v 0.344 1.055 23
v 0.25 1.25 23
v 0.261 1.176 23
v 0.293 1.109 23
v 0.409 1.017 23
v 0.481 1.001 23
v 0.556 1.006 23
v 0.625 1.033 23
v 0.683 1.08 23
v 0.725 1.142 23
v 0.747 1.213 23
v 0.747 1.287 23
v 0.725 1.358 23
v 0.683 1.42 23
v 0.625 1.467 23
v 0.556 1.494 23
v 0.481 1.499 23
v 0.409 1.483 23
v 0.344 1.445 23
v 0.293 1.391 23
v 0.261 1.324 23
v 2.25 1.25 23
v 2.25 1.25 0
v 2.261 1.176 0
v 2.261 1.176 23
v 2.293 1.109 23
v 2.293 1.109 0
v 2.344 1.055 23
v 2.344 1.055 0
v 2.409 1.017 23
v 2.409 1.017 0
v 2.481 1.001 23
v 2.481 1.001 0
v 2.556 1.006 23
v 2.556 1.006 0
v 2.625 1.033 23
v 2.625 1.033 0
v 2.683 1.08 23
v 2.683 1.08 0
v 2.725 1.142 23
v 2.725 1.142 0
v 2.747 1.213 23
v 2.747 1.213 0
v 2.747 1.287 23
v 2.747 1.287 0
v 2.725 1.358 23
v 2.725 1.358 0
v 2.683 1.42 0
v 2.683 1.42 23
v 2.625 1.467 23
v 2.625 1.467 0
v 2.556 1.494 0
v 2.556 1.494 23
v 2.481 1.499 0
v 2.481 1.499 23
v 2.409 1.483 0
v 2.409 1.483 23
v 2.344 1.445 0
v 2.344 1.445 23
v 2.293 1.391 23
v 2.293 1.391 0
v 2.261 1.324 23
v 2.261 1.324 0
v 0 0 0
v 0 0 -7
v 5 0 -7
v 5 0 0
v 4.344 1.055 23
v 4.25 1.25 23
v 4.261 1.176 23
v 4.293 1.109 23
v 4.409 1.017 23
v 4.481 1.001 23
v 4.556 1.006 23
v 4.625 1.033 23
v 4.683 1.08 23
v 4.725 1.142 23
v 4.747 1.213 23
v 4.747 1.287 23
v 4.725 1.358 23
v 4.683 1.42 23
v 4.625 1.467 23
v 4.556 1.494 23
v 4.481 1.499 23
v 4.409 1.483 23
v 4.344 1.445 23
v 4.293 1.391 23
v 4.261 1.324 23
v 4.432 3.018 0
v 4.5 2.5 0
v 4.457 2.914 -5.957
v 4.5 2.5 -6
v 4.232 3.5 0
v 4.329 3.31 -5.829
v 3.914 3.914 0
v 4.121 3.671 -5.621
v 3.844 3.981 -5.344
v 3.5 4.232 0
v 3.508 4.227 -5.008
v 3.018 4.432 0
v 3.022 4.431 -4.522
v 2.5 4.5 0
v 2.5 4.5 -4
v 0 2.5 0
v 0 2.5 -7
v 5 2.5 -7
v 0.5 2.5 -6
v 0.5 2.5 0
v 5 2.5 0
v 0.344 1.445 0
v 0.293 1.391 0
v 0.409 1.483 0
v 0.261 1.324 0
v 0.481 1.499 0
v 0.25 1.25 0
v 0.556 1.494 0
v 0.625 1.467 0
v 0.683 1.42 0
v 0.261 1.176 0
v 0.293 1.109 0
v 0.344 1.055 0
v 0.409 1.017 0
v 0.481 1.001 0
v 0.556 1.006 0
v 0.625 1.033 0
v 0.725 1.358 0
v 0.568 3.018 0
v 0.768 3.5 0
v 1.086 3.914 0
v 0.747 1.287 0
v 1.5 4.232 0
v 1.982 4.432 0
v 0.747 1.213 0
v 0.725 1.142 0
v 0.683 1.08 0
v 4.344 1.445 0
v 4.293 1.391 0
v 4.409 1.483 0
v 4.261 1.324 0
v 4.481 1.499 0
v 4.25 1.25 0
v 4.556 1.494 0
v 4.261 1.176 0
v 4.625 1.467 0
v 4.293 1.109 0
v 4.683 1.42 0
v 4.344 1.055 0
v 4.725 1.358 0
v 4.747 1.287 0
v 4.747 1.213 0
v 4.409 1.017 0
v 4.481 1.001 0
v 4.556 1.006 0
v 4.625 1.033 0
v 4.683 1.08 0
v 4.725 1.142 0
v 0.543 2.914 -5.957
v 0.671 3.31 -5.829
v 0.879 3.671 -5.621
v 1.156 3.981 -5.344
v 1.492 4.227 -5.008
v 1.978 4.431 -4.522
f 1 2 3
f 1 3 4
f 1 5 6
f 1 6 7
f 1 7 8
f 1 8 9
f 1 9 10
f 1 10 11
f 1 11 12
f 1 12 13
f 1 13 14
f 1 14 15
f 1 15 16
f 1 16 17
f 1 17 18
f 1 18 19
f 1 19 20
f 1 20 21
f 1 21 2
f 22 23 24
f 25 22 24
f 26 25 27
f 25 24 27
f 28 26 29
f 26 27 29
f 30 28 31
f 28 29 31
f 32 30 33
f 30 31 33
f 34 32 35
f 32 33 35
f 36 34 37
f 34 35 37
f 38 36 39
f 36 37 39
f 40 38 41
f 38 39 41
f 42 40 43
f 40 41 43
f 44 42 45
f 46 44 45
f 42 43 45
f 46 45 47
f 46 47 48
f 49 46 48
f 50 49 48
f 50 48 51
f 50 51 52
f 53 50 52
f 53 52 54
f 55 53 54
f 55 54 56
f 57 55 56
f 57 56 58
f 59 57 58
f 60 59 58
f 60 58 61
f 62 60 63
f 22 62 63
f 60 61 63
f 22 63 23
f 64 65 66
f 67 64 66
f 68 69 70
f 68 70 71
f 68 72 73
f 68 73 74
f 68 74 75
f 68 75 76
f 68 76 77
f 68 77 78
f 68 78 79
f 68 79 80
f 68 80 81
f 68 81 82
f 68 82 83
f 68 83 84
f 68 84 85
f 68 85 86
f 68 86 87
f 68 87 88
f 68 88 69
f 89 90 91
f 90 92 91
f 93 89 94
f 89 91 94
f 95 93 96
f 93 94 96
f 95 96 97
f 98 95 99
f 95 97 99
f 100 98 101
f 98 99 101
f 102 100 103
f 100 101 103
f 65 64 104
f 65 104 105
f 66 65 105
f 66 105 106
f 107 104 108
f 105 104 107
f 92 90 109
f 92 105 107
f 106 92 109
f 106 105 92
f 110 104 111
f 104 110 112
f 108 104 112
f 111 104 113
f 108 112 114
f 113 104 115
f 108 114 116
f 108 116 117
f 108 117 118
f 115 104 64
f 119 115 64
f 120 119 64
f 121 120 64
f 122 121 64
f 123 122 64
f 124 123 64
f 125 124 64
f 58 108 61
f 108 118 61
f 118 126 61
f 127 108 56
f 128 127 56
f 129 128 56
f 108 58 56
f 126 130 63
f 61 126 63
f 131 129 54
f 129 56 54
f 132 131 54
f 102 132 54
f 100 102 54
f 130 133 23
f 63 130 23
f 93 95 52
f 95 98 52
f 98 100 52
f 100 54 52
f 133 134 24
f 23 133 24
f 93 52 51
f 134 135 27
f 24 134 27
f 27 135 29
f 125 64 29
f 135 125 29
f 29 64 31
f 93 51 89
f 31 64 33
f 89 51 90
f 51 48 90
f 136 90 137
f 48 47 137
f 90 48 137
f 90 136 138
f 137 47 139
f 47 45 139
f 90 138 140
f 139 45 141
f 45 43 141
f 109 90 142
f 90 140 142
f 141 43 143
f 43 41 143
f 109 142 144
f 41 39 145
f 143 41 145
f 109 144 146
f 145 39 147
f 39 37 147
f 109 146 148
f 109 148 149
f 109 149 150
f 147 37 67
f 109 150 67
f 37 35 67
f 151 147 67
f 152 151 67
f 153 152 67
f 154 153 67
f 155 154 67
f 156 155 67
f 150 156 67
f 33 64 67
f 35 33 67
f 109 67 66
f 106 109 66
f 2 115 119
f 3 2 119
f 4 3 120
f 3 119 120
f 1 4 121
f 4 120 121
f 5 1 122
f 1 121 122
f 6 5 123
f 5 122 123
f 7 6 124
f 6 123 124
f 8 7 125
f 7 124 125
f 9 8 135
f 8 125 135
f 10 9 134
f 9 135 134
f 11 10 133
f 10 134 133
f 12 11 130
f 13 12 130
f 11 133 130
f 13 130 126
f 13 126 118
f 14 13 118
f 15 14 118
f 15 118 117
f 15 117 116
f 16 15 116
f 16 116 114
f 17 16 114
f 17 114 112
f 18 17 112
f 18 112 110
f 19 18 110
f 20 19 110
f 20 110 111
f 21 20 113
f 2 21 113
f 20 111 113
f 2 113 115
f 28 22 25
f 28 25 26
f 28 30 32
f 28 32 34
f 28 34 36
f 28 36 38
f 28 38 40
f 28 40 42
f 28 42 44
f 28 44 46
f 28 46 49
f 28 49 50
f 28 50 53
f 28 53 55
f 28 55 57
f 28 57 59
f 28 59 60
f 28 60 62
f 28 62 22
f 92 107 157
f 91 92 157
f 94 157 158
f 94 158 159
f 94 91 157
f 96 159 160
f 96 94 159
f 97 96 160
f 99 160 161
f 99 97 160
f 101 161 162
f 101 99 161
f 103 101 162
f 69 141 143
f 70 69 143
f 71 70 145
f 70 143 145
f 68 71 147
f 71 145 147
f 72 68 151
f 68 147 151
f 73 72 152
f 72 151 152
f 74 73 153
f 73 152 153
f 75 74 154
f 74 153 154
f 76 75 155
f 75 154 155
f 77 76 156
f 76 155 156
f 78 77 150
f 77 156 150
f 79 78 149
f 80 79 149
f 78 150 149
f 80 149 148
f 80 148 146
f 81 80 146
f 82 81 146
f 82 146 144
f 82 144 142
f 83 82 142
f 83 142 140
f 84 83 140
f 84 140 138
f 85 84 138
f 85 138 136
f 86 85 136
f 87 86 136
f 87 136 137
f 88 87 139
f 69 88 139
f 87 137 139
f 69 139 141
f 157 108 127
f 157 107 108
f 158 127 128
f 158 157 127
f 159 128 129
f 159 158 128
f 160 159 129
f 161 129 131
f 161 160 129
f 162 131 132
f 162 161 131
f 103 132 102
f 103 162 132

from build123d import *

# Parameters (mm, degrees)
ESQUISSE1_W        = 5
ESQUISSE1_H        = 7
BOSS_EXTRU_1_DEPTH = 2.5
ESQUISSE2_R        = 0.25
BOSS_EXTRU_2_DEPTH = 23
ESQUISSE3_W        = 4
ESQUISSE3_H        = 6
BOSS_EXTRU_3_DEPTH = 2
CONG_1_R           = 2


with BuildPart() as part:
    # Esquisse1 → Boss.-Extru.1 (new body)
    with BuildSketch(Plane(origin=(0, 0, 0), x_dir=(1, 0, 0), z_dir=(0, 1, 0))):
        with Locations((2.5, 3.5)):
            Rectangle(ESQUISSE1_W, ESQUISSE1_H)
    extrude(amount=BOSS_EXTRU_1_DEPTH)

    # Esquisse2 → Boss.-Extru.2 (add)
    with BuildSketch(Plane.XY):
        with Locations(Location((0.5, 1.25, 0), (0, 0, 180))):
            Circle(ESQUISSE2_R)
        with Locations(Location((2.5, 1.25, 0), (0, 0, 180))):
            Circle(ESQUISSE2_R)
        with Locations(Location((4.5, 1.25, 0), (0, 0, 180))):
            Circle(ESQUISSE2_R)
    extrude(amount=BOSS_EXTRU_2_DEPTH)

    # Esquisse3 → Boss.-Extru.3 (add)
    with BuildSketch(Plane(origin=(0, 2.5, 0), x_dir=(1, 0, 0), z_dir=(0, 1, 0))):
        with Locations((2.5, 3)):
            Rectangle(ESQUISSE3_W, ESQUISSE3_H)
    extrude(amount=BOSS_EXTRU_3_DEPTH)

    # Congé1
    cong_1_edges = [part.edges().sort_by_distance(p)[0] for p in [
        (4.5, 4.5, -3),
        (2.5, 4.5, -6),
        (0.5, 4.5, -3),
    ]]
    fillet(cong_1_edges, radius=CONG_1_R - 0.0001)  # a hair under: the kernel refuses the full size


solid = part.part
